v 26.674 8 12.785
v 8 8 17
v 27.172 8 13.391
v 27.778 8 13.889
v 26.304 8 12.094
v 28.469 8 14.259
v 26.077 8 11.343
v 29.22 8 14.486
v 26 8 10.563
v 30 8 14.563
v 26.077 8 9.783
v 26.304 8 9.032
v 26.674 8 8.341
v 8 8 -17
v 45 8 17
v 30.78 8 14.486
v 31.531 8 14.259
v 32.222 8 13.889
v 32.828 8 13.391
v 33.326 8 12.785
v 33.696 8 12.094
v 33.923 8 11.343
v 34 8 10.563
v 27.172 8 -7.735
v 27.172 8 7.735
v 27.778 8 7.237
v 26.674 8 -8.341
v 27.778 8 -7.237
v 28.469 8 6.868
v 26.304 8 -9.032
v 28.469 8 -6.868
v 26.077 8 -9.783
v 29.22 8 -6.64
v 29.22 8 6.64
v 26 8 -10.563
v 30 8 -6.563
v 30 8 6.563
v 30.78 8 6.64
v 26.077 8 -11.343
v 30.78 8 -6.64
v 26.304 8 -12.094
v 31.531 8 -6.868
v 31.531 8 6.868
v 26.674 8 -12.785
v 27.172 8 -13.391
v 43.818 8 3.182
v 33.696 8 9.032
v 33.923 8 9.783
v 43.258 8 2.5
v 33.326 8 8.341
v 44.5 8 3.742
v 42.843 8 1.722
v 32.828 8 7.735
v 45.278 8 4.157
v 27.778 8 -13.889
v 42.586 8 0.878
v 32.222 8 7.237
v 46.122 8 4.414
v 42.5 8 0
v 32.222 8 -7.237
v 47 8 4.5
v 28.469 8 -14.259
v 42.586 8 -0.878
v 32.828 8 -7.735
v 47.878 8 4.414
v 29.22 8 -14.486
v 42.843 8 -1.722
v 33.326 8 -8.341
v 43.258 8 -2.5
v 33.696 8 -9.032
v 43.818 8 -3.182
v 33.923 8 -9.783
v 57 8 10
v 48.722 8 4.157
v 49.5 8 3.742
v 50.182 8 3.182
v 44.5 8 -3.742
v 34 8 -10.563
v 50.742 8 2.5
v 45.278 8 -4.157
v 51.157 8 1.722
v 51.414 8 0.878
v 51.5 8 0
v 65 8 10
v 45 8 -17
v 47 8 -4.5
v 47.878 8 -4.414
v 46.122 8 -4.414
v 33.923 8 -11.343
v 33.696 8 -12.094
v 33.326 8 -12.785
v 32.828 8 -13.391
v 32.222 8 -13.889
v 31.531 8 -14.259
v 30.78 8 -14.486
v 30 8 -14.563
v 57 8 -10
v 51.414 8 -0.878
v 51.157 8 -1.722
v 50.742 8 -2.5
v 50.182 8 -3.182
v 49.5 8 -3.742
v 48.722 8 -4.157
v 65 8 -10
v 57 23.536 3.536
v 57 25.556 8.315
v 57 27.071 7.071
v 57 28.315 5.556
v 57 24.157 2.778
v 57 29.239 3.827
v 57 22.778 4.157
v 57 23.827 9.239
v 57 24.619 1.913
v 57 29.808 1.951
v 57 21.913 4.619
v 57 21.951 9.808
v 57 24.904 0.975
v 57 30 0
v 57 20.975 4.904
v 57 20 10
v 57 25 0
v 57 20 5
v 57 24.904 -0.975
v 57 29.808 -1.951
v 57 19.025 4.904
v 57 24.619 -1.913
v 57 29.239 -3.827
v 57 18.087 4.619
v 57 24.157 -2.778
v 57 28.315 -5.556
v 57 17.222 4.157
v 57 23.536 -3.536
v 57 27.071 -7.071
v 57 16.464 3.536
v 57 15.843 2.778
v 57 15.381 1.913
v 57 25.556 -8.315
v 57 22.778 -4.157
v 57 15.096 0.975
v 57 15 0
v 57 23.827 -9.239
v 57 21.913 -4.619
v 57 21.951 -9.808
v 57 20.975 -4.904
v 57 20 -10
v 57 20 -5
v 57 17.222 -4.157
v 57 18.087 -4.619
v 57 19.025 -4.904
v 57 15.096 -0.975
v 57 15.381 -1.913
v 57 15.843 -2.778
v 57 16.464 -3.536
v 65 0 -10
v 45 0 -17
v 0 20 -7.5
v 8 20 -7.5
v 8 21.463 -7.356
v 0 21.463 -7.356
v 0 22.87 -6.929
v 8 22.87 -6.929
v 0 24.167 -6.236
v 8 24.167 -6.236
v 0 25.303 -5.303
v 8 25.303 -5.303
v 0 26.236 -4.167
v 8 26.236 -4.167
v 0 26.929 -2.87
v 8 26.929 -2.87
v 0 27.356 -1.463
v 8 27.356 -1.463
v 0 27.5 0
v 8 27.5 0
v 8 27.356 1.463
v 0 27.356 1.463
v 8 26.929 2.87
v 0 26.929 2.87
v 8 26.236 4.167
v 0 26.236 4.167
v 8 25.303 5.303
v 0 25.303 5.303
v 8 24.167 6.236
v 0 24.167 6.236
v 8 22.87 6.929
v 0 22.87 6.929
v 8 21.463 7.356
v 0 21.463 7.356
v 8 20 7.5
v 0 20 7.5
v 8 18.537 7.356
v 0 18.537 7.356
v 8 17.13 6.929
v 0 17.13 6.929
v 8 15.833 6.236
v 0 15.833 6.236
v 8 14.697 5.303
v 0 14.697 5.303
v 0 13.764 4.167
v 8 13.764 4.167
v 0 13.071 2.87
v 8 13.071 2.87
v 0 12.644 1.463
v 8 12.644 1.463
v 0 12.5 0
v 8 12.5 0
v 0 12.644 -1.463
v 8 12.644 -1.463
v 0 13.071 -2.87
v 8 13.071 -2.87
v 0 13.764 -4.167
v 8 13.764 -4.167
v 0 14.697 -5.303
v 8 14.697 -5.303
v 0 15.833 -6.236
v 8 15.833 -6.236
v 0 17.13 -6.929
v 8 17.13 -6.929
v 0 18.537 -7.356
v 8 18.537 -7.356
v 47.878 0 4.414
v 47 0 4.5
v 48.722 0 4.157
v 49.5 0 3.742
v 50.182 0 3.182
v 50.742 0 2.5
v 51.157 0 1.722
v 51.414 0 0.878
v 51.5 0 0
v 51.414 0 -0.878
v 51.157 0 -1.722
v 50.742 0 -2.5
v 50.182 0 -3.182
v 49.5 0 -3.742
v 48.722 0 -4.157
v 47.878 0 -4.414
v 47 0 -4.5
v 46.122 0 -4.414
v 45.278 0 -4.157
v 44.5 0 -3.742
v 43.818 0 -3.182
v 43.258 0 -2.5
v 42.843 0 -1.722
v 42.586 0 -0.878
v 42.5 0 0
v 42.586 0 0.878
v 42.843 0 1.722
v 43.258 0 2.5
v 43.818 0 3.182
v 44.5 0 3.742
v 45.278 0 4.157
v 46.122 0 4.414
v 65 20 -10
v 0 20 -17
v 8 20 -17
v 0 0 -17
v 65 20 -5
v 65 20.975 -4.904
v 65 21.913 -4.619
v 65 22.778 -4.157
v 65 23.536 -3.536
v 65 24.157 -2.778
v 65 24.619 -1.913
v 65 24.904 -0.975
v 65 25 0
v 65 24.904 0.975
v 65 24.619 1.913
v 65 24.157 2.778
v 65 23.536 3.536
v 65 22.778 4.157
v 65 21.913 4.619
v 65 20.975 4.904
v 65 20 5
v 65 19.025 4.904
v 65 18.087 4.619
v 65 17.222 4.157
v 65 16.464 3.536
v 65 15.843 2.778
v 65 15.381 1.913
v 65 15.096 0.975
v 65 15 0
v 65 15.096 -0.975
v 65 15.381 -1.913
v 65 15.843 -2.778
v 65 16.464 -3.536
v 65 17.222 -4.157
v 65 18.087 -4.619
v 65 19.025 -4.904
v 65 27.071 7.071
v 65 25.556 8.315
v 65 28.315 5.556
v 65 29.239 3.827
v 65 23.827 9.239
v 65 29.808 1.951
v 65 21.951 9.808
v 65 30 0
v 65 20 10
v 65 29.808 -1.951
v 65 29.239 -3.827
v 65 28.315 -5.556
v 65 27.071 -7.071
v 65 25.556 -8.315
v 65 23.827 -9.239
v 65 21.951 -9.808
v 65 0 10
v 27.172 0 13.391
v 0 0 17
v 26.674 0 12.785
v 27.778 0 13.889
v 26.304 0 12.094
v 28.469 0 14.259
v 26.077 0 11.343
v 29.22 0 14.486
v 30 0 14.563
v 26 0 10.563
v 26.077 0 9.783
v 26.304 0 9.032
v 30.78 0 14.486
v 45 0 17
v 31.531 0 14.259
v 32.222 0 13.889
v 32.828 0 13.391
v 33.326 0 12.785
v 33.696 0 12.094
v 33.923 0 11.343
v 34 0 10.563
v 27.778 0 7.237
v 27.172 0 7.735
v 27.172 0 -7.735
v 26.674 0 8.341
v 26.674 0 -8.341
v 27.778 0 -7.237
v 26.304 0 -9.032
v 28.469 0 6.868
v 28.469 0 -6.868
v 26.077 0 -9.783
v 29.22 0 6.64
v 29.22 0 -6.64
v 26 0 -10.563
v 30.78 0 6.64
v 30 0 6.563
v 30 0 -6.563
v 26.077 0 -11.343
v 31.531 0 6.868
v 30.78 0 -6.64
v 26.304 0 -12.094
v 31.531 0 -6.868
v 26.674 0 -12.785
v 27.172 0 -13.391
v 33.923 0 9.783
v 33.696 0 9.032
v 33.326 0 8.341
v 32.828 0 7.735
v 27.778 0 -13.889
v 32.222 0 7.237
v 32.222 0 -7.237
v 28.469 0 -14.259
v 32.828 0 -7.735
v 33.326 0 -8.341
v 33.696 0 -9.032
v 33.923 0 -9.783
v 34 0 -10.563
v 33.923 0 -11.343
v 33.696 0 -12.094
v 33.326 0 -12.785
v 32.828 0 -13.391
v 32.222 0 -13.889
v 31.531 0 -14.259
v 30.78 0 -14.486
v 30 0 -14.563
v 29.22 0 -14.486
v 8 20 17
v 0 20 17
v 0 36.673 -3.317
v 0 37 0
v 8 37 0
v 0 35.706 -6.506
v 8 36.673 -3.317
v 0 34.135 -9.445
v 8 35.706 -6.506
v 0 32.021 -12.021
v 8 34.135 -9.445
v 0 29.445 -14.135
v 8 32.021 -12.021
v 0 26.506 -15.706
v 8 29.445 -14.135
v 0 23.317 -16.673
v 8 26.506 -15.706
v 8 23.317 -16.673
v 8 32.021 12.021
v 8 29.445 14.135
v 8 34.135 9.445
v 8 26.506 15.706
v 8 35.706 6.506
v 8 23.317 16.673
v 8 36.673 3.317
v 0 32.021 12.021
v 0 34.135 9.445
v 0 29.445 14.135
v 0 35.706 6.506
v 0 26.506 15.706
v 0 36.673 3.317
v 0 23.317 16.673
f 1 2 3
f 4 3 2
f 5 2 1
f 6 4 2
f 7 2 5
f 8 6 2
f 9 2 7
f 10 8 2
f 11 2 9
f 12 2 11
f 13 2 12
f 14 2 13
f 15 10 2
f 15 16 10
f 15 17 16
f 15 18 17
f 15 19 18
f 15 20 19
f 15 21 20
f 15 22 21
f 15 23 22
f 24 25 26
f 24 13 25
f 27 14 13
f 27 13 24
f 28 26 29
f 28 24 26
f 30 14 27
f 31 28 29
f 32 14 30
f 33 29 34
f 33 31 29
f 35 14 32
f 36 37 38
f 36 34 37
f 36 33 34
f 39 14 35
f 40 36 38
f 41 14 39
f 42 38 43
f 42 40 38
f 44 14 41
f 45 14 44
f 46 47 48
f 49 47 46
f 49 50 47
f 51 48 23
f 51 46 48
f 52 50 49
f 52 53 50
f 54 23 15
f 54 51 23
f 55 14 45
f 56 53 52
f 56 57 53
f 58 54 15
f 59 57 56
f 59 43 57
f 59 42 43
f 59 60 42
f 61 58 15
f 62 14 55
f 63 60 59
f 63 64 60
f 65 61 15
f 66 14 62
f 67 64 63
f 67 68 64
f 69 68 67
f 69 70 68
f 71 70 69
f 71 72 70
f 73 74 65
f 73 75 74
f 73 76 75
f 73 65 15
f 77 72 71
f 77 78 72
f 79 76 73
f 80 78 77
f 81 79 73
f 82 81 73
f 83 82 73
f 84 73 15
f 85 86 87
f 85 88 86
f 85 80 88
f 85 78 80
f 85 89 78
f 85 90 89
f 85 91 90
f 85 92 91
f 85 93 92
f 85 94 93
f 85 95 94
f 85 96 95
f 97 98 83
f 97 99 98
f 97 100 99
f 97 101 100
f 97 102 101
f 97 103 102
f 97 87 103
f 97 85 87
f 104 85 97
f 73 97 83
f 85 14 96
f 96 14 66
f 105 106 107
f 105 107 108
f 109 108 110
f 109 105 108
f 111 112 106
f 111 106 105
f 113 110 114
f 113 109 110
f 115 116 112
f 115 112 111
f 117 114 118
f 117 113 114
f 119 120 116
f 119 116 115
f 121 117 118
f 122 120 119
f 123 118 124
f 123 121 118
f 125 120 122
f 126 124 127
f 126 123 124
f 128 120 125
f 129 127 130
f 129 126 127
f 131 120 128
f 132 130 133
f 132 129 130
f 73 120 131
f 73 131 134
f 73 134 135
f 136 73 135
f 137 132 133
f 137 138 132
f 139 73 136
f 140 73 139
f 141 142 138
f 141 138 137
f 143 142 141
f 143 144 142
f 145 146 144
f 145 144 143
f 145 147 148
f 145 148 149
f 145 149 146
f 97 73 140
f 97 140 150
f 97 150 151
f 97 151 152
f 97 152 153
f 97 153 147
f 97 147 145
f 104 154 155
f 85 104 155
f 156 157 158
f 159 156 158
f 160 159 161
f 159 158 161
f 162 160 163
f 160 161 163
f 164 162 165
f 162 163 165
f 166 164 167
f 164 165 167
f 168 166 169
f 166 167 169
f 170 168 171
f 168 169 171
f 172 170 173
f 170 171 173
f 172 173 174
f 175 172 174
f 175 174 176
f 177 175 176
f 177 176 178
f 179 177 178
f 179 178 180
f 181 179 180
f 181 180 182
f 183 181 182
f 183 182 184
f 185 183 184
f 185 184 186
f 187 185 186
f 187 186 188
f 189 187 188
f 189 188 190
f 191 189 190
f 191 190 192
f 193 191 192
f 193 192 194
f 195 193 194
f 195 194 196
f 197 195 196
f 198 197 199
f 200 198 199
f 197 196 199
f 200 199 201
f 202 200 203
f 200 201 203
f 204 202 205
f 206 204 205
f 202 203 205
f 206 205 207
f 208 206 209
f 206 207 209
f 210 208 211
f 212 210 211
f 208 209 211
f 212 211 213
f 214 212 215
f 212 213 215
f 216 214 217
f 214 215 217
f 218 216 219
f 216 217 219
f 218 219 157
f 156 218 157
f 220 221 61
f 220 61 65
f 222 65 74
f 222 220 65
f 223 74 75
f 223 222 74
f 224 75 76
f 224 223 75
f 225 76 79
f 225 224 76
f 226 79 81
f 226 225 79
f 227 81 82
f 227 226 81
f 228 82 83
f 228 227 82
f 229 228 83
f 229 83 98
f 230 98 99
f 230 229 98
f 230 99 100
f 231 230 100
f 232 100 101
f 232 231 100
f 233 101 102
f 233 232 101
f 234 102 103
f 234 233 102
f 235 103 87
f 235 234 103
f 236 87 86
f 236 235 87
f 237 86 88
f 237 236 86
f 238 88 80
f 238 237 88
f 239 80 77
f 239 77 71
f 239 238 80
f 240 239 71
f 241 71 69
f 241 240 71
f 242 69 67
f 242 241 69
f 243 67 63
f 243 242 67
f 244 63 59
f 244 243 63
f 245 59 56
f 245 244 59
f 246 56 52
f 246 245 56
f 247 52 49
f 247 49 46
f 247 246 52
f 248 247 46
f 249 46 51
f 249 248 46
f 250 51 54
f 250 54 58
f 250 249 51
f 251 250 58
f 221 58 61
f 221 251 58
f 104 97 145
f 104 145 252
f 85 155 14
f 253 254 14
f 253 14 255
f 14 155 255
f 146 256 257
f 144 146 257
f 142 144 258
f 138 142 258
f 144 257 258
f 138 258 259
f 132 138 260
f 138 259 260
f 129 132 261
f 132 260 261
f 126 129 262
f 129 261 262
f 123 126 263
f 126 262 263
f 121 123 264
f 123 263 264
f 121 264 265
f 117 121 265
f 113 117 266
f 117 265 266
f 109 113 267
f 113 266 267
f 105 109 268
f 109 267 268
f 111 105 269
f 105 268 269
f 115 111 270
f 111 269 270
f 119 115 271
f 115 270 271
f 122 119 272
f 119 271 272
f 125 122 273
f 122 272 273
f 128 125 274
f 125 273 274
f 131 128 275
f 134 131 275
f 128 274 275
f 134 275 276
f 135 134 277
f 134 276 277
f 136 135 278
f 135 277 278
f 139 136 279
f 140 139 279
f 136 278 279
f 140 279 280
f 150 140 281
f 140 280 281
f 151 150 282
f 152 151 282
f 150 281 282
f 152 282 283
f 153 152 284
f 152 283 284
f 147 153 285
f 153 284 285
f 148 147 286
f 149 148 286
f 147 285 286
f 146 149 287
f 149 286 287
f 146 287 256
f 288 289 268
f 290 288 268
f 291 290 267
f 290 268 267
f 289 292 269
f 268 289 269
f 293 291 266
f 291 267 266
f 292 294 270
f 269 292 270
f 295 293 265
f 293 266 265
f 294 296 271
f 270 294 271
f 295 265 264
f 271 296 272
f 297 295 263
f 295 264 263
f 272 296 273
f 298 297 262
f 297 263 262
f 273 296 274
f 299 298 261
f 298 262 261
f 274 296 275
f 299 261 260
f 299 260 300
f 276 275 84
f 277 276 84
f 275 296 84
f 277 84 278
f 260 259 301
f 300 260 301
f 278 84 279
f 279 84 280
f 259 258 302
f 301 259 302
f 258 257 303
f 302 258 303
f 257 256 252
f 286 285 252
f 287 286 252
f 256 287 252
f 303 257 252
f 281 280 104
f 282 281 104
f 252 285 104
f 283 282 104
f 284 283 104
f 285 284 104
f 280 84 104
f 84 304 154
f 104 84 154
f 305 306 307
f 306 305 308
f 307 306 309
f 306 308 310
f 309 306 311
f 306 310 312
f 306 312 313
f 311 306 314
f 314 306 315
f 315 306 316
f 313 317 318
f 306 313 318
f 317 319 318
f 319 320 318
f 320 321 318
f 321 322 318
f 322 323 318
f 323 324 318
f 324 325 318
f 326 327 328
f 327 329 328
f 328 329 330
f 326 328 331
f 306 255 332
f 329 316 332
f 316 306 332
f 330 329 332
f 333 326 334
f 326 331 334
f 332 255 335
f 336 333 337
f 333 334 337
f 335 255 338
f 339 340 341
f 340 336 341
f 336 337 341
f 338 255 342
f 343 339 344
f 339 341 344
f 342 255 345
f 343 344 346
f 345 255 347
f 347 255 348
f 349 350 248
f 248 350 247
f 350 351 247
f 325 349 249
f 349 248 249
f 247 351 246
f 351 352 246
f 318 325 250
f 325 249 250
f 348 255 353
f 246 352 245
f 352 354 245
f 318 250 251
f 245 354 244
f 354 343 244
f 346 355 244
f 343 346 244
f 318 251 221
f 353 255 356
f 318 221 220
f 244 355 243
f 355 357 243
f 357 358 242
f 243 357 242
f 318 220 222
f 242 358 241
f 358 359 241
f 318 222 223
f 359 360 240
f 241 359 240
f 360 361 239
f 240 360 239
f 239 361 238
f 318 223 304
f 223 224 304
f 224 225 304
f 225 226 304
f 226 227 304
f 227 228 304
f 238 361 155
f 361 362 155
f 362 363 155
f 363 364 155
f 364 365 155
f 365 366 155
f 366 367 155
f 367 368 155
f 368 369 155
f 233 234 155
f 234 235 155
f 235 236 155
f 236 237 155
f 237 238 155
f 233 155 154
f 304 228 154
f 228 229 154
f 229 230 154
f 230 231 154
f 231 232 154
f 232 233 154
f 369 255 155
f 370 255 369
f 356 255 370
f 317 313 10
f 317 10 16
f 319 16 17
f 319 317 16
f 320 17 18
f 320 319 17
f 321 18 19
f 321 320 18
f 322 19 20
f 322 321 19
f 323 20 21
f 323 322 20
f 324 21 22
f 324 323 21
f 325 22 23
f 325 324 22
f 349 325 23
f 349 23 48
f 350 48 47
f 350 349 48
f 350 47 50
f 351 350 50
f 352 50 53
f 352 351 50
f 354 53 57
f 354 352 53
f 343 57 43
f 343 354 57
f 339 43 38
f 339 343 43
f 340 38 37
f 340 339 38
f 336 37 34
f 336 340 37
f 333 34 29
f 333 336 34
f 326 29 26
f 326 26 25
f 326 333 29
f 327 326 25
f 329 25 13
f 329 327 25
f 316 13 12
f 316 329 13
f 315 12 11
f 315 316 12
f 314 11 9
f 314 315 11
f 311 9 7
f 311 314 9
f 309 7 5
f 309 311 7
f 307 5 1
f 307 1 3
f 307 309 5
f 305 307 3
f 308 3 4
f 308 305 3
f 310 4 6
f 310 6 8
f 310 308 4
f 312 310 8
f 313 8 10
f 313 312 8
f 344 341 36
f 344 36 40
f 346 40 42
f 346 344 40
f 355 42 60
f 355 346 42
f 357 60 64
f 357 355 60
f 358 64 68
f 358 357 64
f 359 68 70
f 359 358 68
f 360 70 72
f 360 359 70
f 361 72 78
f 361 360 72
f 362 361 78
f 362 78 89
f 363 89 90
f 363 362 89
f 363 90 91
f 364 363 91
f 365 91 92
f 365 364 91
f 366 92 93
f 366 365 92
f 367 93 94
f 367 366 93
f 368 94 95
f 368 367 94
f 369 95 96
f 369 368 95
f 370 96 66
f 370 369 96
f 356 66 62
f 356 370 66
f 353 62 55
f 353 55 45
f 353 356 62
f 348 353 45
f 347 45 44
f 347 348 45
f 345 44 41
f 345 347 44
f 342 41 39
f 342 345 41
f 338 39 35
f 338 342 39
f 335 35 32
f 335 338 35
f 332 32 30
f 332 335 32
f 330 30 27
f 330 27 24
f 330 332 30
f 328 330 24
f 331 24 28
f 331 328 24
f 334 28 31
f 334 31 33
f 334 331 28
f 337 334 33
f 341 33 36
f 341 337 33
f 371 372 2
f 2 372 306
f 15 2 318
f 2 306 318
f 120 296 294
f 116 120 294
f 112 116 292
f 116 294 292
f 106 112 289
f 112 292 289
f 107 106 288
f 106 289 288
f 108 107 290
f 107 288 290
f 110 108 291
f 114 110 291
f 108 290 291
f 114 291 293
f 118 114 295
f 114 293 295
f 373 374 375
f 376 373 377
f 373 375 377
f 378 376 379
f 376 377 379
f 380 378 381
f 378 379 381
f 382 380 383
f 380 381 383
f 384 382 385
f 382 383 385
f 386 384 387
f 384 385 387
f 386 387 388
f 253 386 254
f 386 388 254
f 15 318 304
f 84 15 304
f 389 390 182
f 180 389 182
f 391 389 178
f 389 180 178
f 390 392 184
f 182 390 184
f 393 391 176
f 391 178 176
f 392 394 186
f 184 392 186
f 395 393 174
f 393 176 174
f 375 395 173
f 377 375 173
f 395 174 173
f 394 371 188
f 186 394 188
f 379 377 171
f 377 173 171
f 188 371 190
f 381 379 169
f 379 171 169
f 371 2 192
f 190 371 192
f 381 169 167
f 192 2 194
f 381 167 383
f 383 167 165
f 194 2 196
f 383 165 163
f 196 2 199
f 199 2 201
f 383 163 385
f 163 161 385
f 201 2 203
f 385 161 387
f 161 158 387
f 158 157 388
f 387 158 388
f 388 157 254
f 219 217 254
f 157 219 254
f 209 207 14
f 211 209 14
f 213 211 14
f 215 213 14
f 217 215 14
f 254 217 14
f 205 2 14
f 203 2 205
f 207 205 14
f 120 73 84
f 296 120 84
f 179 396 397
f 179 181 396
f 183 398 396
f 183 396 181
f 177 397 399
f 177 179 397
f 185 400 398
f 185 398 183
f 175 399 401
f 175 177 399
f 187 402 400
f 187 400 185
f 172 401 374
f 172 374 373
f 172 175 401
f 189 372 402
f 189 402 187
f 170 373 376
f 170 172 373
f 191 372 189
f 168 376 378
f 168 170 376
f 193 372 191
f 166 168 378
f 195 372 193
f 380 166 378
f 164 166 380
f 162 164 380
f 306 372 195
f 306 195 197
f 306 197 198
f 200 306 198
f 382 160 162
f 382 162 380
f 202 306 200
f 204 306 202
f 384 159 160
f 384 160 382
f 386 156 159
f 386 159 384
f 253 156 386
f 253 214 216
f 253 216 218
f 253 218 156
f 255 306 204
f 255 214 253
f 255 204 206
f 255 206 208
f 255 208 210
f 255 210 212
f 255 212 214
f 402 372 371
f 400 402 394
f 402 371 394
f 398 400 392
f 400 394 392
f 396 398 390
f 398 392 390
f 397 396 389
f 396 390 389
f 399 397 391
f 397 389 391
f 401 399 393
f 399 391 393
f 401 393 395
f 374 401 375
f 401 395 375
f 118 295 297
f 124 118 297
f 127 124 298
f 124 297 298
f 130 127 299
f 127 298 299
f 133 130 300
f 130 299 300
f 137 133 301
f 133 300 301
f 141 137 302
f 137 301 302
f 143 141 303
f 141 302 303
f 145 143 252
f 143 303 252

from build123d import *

# Parameters (mm, degrees)
SKETCH1_R           = 4
SKETCH1_R_2         = 4.5
SKETCH1_W           = 8
SKETCH1_H           = 34
SKETCH1_H_2         = 20
BOSS_EXTRUDE1_DEPTH = 8
SKETCH1_4_W         = 8
SKETCH1_4_H         = 34
BOSS_EXTRUDE2_DEPTH = 37
SKETCH1_5_W         = 8
SKETCH1_5_H         = 20
BOSS_EXTRUDE3_DEPTH = 30
SKETCH4_R           = 5
CUT_EXTRUDE1_DEPTH  = 8
SKETCH5_R           = 7.5
CUT_EXTRUDE2_DEPTH  = 71.049982156


with BuildPart() as part:
    # Sketch1 → Boss-Extrude1 (new body)
    # profile 1 of 3: a face of its own
    with BuildSketch(Plane(origin=(0, 0, 0), x_dir=(1, 0, 0), z_dir=(0, 1, 0))):
        Polygon((8, 17), (8, -17), (45, -17), (65, -10), (57, -10), (57, 10), (65, 10), (45, 17), align=None)
        with Locations(Location((30, -10.563020066, 0), (0, 0, 270))):
            Circle(SKETCH1_R, mode=Mode.SUBTRACT)
        with Locations(Location((30, 10.563020066, 0), (0, 0, 270))):
            Circle(SKETCH1_R, mode=Mode.SUBTRACT)
        with Locations(Location((47, 0, 0), (0, 0, 270))):
            Circle(SKETCH1_R_2, mode=Mode.SUBTRACT)
    # profile 2 of 3: a face of its own
    with BuildSketch(Plane(origin=(0, 0, 0), x_dir=(1, 0, 0), z_dir=(0, 1, 0))):
        with Locations((4, 0)):
            Rectangle(SKETCH1_W, SKETCH1_H)
    # profile 3 of 3: a face of its own
    with BuildSketch(Plane(origin=(0, 0, 0), x_dir=(1, 0, 0), z_dir=(0, 1, 0))):
        with Locations((61, 0)):
            Rectangle(SKETCH1_W, SKETCH1_H_2)
    extrude(amount=BOSS_EXTRUDE1_DEPTH)

    # Sketch1<4> → Boss-Extrude2 (add)
    with BuildSketch(Plane(origin=(0, 0, 0), x_dir=(1, 0, 0), z_dir=(0, 1, 0))):
        with Locations((4, 0)):
            Rectangle(SKETCH1_4_W, SKETCH1_4_H)
    extrude(amount=BOSS_EXTRUDE2_DEPTH)

    # Sketch1<5> → Boss-Extrude3 (add)
    with BuildSketch(Plane(origin=(0, 0, 0), x_dir=(1, 0, 0), z_dir=(0, 1, 0))):
        with Locations((61, 0)):
            Rectangle(SKETCH1_5_W, SKETCH1_5_H)
    extrude(amount=BOSS_EXTRUDE3_DEPTH)

    # Sketch4 → Cut-Extrude1 (cut)
    with BuildSketch(Plane(origin=(65, 0, 0), x_dir=(0, 0, -1), z_dir=(1, 0, 0))):
        with BuildLine():
            ThreePointArc((0, 30), (7.071067812, 27.071067812), (10, 20))
            Line((10, 20), (10, 30))
            Line((10, 30), (0, 30))
        make_face()
        with BuildLine():
            ThreePointArc((-10, 20), (-7.071067812, 27.071067812), (0, 30))
            Line((0, 30), (-10, 30))
            Line((-10, 30), (-10, 20))
        make_face()
        with Locations((0, 20)):
            Circle(SKETCH4_R)
    extrude(amount=-CUT_EXTRUDE1_DEPTH, mode=Mode.SUBTRACT)

    # Sketch5 → Cut-Extrude2 (cut, through all)
    with BuildSketch(Plane(origin=(8, 0, 0), x_dir=(0, 0, -1), z_dir=(1, 0, 0))):
        with BuildLine():
            ThreePointArc((-17, 20), (-12.02081528, 32.02081528), (0, 37))
            Line((0, 37), (-17, 37))
            Line((-17, 37), (-17, 20))
        make_face()
        with BuildLine():
            ThreePointArc((0, 37), (12.02081528, 32.02081528), (17, 20))
            Line((17, 20), (17, 37))
            Line((17, 37), (0, 37))
        make_face()
        with Locations((0, 20)):
            Circle(SKETCH5_R)
    extrude(amount=-CUT_EXTRUDE2_DEPTH, mode=Mode.SUBTRACT)


solid = part.part
